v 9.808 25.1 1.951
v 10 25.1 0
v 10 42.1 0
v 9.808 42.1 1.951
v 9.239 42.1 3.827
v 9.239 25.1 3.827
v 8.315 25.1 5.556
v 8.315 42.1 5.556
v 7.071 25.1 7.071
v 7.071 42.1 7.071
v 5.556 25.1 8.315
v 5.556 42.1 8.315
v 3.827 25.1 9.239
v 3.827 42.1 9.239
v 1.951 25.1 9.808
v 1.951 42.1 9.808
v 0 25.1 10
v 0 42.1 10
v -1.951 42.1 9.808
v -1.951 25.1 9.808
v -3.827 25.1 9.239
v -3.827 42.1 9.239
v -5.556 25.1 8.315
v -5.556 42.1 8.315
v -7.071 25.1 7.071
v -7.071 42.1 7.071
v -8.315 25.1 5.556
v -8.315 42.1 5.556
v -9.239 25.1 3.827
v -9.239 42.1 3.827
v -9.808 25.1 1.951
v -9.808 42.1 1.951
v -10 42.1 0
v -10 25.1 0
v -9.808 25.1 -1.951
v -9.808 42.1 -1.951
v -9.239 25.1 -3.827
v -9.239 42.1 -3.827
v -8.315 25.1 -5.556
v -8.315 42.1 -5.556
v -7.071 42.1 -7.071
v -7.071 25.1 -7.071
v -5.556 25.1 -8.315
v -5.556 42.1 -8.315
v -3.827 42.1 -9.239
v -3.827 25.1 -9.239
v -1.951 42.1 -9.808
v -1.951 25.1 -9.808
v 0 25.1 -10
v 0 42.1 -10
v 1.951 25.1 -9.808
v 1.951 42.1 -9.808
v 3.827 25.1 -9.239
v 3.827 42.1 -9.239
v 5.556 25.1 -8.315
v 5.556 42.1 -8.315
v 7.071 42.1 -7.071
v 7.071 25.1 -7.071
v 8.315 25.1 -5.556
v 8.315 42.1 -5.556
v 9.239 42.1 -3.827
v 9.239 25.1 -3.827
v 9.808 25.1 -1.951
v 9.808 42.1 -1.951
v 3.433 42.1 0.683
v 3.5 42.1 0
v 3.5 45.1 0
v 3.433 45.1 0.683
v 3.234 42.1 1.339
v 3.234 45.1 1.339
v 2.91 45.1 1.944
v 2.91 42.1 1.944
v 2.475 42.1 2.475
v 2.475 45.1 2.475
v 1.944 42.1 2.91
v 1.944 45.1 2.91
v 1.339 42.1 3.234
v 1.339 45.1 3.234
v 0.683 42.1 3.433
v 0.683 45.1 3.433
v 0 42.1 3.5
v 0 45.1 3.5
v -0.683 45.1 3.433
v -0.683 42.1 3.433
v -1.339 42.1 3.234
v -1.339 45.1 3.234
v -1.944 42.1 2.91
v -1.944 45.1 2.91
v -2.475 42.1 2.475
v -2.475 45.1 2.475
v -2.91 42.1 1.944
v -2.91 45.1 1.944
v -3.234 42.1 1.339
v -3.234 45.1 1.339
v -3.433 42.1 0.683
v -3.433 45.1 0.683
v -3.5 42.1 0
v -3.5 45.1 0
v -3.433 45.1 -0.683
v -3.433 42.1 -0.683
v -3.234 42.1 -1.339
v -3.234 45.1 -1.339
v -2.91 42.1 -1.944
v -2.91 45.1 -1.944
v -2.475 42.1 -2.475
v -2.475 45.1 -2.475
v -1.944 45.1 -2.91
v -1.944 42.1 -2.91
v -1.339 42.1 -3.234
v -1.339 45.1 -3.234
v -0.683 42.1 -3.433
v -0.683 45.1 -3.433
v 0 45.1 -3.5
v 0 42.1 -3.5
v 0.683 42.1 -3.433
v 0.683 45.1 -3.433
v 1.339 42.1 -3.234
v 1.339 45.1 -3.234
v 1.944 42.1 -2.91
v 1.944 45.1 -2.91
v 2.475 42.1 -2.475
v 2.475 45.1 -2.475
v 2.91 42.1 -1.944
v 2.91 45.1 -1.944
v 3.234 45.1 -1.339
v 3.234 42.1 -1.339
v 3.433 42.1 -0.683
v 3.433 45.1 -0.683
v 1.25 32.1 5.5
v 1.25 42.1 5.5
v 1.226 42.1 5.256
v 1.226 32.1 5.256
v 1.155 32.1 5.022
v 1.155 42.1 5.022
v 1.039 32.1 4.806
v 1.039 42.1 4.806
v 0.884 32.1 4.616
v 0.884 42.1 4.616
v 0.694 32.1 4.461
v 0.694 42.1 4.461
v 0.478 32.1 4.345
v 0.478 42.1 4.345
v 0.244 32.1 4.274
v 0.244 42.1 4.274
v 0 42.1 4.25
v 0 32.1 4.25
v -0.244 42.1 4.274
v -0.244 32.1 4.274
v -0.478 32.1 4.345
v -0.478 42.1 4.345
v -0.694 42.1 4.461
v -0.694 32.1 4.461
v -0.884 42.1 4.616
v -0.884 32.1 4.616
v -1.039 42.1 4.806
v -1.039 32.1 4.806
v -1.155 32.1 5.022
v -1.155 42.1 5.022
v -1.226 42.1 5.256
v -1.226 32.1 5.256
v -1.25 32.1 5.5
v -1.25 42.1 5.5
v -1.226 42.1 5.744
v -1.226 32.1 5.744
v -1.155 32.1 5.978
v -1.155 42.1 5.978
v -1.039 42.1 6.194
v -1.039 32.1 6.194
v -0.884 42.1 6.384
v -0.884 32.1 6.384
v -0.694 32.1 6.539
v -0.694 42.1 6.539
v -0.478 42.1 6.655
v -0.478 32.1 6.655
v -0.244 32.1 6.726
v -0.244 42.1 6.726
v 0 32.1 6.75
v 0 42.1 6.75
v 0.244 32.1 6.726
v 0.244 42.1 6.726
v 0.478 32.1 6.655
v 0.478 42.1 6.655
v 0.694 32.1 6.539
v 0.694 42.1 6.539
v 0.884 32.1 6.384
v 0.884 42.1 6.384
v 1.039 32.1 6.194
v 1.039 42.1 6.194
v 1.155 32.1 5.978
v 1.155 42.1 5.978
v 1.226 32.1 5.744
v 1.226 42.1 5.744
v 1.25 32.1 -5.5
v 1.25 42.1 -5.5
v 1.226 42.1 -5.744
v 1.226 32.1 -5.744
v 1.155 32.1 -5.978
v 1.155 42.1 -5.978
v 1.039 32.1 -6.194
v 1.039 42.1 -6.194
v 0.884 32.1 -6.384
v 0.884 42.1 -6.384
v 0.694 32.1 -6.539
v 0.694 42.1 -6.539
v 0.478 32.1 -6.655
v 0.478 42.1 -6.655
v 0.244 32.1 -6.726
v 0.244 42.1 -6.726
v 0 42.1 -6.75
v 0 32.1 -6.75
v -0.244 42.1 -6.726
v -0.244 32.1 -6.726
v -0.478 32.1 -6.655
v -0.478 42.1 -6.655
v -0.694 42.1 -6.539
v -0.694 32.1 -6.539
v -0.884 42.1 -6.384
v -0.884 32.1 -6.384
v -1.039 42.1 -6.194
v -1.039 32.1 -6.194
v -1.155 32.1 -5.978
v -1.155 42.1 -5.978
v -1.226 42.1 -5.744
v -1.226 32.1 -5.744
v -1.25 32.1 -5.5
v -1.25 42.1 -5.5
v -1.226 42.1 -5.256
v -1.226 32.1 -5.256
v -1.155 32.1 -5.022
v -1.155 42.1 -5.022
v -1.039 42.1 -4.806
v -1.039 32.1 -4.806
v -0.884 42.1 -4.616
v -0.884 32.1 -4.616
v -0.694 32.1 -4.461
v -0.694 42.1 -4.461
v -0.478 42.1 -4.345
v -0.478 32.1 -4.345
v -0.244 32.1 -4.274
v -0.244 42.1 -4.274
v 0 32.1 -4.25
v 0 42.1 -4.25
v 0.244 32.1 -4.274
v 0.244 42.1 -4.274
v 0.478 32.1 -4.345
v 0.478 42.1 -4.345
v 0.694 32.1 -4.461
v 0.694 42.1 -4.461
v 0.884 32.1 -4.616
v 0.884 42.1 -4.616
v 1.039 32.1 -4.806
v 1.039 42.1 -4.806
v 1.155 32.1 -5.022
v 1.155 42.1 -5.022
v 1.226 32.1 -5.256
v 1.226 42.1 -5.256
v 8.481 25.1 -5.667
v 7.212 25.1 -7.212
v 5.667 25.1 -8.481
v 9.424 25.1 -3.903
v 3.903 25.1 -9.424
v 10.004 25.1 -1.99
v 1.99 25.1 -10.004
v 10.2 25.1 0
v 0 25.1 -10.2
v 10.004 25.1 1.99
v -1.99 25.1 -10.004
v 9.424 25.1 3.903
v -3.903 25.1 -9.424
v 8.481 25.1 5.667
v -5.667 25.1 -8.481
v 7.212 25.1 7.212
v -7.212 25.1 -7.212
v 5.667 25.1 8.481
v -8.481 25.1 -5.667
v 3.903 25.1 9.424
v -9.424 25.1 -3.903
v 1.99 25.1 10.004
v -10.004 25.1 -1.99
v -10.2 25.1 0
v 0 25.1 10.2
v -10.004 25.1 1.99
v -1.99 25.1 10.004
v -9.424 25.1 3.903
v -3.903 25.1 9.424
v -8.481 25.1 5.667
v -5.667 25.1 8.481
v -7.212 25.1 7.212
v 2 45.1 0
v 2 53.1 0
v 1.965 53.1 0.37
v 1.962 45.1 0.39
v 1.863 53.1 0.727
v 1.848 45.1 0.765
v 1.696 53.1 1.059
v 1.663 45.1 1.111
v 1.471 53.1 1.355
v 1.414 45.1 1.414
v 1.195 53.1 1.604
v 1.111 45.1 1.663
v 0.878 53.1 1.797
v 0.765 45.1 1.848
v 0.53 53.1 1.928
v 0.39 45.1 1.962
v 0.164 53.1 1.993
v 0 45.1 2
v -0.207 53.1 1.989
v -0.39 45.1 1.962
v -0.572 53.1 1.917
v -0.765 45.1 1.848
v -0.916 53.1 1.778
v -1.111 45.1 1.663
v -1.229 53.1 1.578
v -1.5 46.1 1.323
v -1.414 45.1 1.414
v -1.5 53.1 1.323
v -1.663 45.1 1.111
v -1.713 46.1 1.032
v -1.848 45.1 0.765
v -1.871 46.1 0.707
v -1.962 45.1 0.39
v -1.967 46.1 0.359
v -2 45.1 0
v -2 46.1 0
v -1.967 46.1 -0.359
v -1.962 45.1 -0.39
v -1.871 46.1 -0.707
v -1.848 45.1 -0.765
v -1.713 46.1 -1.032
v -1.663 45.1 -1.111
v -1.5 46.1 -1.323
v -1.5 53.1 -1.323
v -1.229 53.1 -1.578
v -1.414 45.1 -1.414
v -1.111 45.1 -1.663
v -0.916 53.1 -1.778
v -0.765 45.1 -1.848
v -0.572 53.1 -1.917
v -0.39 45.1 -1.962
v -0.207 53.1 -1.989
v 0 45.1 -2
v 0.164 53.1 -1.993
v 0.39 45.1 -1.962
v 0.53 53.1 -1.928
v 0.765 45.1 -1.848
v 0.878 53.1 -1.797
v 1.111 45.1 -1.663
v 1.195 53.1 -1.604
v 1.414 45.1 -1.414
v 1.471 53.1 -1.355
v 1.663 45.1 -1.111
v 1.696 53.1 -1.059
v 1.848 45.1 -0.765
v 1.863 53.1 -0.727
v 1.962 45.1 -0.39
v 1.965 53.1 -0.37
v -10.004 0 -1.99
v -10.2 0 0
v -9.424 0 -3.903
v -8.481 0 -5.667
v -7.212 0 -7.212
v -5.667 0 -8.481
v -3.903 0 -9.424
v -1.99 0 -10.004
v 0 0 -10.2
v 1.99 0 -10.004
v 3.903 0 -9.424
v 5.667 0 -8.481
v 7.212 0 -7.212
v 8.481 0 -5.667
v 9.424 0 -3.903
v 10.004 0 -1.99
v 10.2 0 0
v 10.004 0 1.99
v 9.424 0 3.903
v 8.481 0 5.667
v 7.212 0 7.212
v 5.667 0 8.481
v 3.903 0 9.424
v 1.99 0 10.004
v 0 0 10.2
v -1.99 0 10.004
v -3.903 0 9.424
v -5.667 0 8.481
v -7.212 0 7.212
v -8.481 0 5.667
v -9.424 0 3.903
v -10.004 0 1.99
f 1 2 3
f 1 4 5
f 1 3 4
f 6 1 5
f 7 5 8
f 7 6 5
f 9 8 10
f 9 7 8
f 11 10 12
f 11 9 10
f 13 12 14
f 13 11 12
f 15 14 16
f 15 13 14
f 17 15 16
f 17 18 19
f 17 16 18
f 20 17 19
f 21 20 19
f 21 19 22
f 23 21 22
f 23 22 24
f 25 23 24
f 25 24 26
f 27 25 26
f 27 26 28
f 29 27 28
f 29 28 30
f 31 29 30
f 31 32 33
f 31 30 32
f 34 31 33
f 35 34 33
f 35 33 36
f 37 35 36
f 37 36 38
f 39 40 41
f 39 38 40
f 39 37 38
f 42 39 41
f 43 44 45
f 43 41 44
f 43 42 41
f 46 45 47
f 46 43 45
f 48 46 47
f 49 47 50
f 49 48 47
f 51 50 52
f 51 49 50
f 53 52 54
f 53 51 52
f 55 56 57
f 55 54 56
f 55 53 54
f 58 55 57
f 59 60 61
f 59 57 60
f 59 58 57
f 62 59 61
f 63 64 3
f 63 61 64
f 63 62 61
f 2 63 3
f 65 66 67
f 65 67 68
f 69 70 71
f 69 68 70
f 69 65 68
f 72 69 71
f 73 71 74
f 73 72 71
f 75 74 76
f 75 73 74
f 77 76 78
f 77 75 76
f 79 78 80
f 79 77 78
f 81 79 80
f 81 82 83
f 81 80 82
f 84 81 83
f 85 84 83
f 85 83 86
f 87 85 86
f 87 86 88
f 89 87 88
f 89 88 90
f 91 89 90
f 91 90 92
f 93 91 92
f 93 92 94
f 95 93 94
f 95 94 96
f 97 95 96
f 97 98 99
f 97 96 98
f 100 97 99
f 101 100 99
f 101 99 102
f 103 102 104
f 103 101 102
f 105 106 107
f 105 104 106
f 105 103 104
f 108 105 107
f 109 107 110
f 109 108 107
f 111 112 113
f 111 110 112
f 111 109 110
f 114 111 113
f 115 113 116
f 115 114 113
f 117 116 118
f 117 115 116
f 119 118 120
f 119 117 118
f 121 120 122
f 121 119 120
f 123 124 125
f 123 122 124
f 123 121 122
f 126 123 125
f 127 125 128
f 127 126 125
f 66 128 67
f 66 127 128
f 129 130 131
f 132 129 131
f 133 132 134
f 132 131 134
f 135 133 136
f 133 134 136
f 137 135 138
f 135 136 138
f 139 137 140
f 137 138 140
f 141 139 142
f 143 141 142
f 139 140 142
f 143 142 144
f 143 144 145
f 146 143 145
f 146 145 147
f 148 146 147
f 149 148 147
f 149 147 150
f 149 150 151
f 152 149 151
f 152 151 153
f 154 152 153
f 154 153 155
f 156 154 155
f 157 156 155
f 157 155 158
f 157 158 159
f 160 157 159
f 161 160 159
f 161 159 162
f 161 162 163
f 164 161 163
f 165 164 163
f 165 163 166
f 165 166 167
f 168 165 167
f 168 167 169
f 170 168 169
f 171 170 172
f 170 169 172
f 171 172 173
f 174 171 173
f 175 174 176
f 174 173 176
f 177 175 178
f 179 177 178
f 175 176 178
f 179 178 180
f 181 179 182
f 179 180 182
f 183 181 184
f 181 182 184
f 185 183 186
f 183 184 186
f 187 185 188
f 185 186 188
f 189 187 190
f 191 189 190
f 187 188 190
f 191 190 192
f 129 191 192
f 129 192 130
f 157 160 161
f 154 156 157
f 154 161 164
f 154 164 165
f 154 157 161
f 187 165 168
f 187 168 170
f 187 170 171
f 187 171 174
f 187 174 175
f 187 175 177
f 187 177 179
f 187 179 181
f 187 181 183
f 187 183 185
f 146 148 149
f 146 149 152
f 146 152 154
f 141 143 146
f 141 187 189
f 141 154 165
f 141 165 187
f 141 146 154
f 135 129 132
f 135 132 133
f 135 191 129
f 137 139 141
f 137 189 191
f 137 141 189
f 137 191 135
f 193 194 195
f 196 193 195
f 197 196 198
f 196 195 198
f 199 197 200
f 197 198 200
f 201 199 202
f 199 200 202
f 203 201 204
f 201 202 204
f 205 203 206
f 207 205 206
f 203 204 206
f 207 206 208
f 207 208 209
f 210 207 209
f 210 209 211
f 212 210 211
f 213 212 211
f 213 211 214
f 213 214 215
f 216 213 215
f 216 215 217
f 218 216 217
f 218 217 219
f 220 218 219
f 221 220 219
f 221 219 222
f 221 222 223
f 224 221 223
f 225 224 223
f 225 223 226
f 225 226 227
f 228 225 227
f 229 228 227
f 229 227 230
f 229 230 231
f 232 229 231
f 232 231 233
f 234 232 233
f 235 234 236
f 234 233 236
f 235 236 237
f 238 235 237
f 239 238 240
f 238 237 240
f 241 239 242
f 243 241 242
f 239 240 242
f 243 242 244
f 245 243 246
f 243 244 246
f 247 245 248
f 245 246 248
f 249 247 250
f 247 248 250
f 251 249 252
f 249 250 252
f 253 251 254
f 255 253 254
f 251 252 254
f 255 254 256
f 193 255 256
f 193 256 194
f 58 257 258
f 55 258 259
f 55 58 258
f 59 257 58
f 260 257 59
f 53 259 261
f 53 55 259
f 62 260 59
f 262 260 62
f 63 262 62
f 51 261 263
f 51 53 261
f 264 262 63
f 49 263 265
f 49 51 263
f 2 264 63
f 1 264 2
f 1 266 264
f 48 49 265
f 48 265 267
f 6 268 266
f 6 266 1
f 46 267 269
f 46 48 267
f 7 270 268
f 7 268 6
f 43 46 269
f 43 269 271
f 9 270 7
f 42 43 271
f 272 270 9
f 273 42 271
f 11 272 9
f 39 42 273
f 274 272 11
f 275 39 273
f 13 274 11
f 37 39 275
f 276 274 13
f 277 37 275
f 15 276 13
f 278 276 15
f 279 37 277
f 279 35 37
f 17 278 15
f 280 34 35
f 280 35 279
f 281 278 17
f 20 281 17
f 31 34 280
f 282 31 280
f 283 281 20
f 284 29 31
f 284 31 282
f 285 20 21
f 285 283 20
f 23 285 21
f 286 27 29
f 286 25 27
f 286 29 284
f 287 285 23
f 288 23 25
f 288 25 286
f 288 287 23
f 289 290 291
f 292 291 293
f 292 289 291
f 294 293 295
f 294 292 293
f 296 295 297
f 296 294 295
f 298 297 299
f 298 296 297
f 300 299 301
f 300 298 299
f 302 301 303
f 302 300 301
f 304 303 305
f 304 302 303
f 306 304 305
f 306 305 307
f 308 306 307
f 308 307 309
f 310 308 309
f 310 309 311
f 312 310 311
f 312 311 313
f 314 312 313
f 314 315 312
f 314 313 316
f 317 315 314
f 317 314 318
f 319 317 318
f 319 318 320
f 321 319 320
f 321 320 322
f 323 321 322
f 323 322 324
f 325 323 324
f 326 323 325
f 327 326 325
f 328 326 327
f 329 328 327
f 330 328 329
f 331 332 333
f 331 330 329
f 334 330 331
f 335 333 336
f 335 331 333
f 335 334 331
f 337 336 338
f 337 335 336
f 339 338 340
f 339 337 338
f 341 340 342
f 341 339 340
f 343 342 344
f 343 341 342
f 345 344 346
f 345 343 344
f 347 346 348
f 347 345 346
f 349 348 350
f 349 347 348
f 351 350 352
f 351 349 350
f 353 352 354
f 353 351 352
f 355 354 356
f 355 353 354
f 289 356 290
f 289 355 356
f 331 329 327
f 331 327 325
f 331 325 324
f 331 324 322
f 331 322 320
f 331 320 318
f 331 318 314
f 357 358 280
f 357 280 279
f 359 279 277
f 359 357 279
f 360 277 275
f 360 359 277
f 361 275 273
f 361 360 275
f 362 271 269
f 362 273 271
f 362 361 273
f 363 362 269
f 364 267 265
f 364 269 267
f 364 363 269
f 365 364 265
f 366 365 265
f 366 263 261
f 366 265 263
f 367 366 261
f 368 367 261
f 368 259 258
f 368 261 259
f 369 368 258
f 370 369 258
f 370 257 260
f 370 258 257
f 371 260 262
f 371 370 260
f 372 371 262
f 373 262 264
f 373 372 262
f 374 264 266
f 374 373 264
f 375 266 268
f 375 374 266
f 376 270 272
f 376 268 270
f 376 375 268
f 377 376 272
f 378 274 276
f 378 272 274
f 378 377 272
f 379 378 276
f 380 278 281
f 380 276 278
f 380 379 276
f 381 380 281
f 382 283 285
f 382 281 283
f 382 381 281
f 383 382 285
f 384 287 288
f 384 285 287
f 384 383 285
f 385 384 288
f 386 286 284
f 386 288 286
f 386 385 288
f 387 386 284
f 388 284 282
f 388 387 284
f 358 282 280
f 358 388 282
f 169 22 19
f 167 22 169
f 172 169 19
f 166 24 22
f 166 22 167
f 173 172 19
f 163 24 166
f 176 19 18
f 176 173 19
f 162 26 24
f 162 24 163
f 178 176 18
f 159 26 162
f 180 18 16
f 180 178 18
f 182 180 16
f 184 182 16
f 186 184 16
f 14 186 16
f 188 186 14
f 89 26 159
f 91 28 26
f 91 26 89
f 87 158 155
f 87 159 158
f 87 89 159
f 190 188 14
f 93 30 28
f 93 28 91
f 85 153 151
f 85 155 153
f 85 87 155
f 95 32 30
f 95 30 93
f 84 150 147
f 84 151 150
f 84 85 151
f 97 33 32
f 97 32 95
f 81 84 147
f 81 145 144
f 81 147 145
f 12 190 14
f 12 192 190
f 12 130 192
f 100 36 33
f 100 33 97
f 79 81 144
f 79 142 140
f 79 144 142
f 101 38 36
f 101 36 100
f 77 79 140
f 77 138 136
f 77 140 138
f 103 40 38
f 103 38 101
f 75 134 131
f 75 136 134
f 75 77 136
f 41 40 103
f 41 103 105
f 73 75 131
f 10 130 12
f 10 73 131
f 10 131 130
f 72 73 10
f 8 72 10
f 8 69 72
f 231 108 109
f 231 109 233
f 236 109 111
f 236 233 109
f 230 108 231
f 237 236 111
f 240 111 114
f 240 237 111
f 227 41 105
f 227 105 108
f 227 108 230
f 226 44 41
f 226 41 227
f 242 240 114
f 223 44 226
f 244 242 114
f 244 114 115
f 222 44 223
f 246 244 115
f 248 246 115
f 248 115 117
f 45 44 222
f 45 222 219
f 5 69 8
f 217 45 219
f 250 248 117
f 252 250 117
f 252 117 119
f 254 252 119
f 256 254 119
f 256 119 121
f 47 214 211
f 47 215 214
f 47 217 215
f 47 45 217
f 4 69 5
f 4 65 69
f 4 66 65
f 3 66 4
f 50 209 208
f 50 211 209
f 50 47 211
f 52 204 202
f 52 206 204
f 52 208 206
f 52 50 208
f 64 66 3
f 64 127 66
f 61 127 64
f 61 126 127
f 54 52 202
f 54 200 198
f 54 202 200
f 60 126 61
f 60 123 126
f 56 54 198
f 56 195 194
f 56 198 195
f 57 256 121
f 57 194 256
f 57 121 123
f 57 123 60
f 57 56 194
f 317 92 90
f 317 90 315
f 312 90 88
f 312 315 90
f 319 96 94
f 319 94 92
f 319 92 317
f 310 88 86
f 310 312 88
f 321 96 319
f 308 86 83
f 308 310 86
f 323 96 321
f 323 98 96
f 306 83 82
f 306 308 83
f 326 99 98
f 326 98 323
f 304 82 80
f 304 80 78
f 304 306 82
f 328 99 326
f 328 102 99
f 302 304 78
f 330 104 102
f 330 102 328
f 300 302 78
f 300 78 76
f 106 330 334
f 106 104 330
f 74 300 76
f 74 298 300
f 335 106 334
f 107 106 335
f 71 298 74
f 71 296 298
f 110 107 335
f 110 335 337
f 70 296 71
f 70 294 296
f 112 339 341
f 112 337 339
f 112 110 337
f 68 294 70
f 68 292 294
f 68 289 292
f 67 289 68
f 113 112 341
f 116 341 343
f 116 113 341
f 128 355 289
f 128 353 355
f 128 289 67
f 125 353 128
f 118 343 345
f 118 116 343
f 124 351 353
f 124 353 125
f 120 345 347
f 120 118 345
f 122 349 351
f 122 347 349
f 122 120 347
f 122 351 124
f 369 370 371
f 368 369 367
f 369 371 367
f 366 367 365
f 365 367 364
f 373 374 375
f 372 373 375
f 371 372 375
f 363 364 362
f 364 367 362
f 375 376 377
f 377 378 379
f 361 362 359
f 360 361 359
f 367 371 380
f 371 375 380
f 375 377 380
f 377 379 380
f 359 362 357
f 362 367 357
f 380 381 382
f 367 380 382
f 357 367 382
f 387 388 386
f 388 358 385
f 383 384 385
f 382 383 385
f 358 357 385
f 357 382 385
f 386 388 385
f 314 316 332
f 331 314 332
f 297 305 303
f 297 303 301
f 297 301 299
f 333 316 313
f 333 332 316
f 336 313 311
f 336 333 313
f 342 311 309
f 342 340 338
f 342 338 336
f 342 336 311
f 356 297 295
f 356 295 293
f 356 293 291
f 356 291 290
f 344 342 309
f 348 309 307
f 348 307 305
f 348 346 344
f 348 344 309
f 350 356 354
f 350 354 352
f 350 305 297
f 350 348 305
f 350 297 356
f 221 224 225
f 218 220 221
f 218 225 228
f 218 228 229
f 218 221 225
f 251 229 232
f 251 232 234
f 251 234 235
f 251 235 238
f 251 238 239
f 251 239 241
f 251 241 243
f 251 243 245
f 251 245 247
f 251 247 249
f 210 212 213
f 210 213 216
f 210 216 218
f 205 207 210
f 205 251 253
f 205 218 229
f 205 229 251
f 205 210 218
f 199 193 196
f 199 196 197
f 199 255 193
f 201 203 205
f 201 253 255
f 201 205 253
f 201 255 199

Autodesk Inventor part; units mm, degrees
ref_plane "YZ Plane" through (0, 0, 0) normal (1, 0, 0) x (0, 1, 0)
ref_plane "XZ Plane" through (0, 0, 0) normal (0, 1, 0) x (-1, 0, 0)
ref_plane "XY Plane" through (0, 0, 0) normal (0, 0, 1) x (1, 0, 0)
sketch "Sketch1" plane through (0, 0, 0) normal (0, 1, 0) x (-1, 0, 0)
  circle A0 centre (0, 0) radius 10.2
  dimension "d0" = 20.4
extrude "Extrusion1" add sketch "Sketch1" along normal blind 25.1
sketch "Sketch2" plane through (0, 25.1, 0) normal (0, 1, 0) x (1, 0, 0)
  circle A0 centre (0, 0) radius 10
  dimension "d3" = 20
extrude "Extrusion2" add sketch "Sketch2" along normal blind 17
sketch "Sketch3" plane through (0, 42.1, 0) normal (0, 1, 0) x (1, 0, 0)
  circle A0 centre (0, 0) radius 3.5
  dimension "d6" = 7
extrude "Extrusion3" add sketch "Sketch3" along normal blind 3
sketch "Sketch4" plane through (0, 45.1, 0) normal (0, 1, 0) x (1, 0, 0)
  circle A0 centre (0, 0) radius 10 projected
  circle A1 centre (0, 0) radius 2
  dimension "d9" = 4
extrude "Extrusion4" add sketch "Sketch4" along normal blind 8 contours A1
sketch "Sketch5" plane through (0, 53.1, 0) normal (0, 1, 0) x (1, 0, 0)
  circle A0 centre (0, 0) radius 2 projected
  circle A1 centre (0, 0) radius 2 projected
  line L0 (-1.5, -1.3229) -> (-1.5, 1.3229)
  point P0 (-2, 0)
  dimension "d12" = 0.5
extrude "Extrusion5" cut sketch "Sketch5" against normal blind 7 contours L0 A0 picked at (-1.5908, -0.3089)
sketch "Sketch6" plane through (0, 42.1, 0) normal (0, 1, 0) x (1, 0, 0)
  circle A0 centre (0, 5.5) radius 1.25
  line L0 (0, 0) -> (3.5, 0) construction
  circle A1 centre (0, 0) radius 3.5 projected
  circle A2 centre (0, -5.5) radius 1.25
  dimension "d15" = 2.5
  dimension "d16" = 11
extrude "Extrusion6" cut sketch "Sketch6" against normal blind 10 contours A0 | A2
properties part number "Stirring motor"
